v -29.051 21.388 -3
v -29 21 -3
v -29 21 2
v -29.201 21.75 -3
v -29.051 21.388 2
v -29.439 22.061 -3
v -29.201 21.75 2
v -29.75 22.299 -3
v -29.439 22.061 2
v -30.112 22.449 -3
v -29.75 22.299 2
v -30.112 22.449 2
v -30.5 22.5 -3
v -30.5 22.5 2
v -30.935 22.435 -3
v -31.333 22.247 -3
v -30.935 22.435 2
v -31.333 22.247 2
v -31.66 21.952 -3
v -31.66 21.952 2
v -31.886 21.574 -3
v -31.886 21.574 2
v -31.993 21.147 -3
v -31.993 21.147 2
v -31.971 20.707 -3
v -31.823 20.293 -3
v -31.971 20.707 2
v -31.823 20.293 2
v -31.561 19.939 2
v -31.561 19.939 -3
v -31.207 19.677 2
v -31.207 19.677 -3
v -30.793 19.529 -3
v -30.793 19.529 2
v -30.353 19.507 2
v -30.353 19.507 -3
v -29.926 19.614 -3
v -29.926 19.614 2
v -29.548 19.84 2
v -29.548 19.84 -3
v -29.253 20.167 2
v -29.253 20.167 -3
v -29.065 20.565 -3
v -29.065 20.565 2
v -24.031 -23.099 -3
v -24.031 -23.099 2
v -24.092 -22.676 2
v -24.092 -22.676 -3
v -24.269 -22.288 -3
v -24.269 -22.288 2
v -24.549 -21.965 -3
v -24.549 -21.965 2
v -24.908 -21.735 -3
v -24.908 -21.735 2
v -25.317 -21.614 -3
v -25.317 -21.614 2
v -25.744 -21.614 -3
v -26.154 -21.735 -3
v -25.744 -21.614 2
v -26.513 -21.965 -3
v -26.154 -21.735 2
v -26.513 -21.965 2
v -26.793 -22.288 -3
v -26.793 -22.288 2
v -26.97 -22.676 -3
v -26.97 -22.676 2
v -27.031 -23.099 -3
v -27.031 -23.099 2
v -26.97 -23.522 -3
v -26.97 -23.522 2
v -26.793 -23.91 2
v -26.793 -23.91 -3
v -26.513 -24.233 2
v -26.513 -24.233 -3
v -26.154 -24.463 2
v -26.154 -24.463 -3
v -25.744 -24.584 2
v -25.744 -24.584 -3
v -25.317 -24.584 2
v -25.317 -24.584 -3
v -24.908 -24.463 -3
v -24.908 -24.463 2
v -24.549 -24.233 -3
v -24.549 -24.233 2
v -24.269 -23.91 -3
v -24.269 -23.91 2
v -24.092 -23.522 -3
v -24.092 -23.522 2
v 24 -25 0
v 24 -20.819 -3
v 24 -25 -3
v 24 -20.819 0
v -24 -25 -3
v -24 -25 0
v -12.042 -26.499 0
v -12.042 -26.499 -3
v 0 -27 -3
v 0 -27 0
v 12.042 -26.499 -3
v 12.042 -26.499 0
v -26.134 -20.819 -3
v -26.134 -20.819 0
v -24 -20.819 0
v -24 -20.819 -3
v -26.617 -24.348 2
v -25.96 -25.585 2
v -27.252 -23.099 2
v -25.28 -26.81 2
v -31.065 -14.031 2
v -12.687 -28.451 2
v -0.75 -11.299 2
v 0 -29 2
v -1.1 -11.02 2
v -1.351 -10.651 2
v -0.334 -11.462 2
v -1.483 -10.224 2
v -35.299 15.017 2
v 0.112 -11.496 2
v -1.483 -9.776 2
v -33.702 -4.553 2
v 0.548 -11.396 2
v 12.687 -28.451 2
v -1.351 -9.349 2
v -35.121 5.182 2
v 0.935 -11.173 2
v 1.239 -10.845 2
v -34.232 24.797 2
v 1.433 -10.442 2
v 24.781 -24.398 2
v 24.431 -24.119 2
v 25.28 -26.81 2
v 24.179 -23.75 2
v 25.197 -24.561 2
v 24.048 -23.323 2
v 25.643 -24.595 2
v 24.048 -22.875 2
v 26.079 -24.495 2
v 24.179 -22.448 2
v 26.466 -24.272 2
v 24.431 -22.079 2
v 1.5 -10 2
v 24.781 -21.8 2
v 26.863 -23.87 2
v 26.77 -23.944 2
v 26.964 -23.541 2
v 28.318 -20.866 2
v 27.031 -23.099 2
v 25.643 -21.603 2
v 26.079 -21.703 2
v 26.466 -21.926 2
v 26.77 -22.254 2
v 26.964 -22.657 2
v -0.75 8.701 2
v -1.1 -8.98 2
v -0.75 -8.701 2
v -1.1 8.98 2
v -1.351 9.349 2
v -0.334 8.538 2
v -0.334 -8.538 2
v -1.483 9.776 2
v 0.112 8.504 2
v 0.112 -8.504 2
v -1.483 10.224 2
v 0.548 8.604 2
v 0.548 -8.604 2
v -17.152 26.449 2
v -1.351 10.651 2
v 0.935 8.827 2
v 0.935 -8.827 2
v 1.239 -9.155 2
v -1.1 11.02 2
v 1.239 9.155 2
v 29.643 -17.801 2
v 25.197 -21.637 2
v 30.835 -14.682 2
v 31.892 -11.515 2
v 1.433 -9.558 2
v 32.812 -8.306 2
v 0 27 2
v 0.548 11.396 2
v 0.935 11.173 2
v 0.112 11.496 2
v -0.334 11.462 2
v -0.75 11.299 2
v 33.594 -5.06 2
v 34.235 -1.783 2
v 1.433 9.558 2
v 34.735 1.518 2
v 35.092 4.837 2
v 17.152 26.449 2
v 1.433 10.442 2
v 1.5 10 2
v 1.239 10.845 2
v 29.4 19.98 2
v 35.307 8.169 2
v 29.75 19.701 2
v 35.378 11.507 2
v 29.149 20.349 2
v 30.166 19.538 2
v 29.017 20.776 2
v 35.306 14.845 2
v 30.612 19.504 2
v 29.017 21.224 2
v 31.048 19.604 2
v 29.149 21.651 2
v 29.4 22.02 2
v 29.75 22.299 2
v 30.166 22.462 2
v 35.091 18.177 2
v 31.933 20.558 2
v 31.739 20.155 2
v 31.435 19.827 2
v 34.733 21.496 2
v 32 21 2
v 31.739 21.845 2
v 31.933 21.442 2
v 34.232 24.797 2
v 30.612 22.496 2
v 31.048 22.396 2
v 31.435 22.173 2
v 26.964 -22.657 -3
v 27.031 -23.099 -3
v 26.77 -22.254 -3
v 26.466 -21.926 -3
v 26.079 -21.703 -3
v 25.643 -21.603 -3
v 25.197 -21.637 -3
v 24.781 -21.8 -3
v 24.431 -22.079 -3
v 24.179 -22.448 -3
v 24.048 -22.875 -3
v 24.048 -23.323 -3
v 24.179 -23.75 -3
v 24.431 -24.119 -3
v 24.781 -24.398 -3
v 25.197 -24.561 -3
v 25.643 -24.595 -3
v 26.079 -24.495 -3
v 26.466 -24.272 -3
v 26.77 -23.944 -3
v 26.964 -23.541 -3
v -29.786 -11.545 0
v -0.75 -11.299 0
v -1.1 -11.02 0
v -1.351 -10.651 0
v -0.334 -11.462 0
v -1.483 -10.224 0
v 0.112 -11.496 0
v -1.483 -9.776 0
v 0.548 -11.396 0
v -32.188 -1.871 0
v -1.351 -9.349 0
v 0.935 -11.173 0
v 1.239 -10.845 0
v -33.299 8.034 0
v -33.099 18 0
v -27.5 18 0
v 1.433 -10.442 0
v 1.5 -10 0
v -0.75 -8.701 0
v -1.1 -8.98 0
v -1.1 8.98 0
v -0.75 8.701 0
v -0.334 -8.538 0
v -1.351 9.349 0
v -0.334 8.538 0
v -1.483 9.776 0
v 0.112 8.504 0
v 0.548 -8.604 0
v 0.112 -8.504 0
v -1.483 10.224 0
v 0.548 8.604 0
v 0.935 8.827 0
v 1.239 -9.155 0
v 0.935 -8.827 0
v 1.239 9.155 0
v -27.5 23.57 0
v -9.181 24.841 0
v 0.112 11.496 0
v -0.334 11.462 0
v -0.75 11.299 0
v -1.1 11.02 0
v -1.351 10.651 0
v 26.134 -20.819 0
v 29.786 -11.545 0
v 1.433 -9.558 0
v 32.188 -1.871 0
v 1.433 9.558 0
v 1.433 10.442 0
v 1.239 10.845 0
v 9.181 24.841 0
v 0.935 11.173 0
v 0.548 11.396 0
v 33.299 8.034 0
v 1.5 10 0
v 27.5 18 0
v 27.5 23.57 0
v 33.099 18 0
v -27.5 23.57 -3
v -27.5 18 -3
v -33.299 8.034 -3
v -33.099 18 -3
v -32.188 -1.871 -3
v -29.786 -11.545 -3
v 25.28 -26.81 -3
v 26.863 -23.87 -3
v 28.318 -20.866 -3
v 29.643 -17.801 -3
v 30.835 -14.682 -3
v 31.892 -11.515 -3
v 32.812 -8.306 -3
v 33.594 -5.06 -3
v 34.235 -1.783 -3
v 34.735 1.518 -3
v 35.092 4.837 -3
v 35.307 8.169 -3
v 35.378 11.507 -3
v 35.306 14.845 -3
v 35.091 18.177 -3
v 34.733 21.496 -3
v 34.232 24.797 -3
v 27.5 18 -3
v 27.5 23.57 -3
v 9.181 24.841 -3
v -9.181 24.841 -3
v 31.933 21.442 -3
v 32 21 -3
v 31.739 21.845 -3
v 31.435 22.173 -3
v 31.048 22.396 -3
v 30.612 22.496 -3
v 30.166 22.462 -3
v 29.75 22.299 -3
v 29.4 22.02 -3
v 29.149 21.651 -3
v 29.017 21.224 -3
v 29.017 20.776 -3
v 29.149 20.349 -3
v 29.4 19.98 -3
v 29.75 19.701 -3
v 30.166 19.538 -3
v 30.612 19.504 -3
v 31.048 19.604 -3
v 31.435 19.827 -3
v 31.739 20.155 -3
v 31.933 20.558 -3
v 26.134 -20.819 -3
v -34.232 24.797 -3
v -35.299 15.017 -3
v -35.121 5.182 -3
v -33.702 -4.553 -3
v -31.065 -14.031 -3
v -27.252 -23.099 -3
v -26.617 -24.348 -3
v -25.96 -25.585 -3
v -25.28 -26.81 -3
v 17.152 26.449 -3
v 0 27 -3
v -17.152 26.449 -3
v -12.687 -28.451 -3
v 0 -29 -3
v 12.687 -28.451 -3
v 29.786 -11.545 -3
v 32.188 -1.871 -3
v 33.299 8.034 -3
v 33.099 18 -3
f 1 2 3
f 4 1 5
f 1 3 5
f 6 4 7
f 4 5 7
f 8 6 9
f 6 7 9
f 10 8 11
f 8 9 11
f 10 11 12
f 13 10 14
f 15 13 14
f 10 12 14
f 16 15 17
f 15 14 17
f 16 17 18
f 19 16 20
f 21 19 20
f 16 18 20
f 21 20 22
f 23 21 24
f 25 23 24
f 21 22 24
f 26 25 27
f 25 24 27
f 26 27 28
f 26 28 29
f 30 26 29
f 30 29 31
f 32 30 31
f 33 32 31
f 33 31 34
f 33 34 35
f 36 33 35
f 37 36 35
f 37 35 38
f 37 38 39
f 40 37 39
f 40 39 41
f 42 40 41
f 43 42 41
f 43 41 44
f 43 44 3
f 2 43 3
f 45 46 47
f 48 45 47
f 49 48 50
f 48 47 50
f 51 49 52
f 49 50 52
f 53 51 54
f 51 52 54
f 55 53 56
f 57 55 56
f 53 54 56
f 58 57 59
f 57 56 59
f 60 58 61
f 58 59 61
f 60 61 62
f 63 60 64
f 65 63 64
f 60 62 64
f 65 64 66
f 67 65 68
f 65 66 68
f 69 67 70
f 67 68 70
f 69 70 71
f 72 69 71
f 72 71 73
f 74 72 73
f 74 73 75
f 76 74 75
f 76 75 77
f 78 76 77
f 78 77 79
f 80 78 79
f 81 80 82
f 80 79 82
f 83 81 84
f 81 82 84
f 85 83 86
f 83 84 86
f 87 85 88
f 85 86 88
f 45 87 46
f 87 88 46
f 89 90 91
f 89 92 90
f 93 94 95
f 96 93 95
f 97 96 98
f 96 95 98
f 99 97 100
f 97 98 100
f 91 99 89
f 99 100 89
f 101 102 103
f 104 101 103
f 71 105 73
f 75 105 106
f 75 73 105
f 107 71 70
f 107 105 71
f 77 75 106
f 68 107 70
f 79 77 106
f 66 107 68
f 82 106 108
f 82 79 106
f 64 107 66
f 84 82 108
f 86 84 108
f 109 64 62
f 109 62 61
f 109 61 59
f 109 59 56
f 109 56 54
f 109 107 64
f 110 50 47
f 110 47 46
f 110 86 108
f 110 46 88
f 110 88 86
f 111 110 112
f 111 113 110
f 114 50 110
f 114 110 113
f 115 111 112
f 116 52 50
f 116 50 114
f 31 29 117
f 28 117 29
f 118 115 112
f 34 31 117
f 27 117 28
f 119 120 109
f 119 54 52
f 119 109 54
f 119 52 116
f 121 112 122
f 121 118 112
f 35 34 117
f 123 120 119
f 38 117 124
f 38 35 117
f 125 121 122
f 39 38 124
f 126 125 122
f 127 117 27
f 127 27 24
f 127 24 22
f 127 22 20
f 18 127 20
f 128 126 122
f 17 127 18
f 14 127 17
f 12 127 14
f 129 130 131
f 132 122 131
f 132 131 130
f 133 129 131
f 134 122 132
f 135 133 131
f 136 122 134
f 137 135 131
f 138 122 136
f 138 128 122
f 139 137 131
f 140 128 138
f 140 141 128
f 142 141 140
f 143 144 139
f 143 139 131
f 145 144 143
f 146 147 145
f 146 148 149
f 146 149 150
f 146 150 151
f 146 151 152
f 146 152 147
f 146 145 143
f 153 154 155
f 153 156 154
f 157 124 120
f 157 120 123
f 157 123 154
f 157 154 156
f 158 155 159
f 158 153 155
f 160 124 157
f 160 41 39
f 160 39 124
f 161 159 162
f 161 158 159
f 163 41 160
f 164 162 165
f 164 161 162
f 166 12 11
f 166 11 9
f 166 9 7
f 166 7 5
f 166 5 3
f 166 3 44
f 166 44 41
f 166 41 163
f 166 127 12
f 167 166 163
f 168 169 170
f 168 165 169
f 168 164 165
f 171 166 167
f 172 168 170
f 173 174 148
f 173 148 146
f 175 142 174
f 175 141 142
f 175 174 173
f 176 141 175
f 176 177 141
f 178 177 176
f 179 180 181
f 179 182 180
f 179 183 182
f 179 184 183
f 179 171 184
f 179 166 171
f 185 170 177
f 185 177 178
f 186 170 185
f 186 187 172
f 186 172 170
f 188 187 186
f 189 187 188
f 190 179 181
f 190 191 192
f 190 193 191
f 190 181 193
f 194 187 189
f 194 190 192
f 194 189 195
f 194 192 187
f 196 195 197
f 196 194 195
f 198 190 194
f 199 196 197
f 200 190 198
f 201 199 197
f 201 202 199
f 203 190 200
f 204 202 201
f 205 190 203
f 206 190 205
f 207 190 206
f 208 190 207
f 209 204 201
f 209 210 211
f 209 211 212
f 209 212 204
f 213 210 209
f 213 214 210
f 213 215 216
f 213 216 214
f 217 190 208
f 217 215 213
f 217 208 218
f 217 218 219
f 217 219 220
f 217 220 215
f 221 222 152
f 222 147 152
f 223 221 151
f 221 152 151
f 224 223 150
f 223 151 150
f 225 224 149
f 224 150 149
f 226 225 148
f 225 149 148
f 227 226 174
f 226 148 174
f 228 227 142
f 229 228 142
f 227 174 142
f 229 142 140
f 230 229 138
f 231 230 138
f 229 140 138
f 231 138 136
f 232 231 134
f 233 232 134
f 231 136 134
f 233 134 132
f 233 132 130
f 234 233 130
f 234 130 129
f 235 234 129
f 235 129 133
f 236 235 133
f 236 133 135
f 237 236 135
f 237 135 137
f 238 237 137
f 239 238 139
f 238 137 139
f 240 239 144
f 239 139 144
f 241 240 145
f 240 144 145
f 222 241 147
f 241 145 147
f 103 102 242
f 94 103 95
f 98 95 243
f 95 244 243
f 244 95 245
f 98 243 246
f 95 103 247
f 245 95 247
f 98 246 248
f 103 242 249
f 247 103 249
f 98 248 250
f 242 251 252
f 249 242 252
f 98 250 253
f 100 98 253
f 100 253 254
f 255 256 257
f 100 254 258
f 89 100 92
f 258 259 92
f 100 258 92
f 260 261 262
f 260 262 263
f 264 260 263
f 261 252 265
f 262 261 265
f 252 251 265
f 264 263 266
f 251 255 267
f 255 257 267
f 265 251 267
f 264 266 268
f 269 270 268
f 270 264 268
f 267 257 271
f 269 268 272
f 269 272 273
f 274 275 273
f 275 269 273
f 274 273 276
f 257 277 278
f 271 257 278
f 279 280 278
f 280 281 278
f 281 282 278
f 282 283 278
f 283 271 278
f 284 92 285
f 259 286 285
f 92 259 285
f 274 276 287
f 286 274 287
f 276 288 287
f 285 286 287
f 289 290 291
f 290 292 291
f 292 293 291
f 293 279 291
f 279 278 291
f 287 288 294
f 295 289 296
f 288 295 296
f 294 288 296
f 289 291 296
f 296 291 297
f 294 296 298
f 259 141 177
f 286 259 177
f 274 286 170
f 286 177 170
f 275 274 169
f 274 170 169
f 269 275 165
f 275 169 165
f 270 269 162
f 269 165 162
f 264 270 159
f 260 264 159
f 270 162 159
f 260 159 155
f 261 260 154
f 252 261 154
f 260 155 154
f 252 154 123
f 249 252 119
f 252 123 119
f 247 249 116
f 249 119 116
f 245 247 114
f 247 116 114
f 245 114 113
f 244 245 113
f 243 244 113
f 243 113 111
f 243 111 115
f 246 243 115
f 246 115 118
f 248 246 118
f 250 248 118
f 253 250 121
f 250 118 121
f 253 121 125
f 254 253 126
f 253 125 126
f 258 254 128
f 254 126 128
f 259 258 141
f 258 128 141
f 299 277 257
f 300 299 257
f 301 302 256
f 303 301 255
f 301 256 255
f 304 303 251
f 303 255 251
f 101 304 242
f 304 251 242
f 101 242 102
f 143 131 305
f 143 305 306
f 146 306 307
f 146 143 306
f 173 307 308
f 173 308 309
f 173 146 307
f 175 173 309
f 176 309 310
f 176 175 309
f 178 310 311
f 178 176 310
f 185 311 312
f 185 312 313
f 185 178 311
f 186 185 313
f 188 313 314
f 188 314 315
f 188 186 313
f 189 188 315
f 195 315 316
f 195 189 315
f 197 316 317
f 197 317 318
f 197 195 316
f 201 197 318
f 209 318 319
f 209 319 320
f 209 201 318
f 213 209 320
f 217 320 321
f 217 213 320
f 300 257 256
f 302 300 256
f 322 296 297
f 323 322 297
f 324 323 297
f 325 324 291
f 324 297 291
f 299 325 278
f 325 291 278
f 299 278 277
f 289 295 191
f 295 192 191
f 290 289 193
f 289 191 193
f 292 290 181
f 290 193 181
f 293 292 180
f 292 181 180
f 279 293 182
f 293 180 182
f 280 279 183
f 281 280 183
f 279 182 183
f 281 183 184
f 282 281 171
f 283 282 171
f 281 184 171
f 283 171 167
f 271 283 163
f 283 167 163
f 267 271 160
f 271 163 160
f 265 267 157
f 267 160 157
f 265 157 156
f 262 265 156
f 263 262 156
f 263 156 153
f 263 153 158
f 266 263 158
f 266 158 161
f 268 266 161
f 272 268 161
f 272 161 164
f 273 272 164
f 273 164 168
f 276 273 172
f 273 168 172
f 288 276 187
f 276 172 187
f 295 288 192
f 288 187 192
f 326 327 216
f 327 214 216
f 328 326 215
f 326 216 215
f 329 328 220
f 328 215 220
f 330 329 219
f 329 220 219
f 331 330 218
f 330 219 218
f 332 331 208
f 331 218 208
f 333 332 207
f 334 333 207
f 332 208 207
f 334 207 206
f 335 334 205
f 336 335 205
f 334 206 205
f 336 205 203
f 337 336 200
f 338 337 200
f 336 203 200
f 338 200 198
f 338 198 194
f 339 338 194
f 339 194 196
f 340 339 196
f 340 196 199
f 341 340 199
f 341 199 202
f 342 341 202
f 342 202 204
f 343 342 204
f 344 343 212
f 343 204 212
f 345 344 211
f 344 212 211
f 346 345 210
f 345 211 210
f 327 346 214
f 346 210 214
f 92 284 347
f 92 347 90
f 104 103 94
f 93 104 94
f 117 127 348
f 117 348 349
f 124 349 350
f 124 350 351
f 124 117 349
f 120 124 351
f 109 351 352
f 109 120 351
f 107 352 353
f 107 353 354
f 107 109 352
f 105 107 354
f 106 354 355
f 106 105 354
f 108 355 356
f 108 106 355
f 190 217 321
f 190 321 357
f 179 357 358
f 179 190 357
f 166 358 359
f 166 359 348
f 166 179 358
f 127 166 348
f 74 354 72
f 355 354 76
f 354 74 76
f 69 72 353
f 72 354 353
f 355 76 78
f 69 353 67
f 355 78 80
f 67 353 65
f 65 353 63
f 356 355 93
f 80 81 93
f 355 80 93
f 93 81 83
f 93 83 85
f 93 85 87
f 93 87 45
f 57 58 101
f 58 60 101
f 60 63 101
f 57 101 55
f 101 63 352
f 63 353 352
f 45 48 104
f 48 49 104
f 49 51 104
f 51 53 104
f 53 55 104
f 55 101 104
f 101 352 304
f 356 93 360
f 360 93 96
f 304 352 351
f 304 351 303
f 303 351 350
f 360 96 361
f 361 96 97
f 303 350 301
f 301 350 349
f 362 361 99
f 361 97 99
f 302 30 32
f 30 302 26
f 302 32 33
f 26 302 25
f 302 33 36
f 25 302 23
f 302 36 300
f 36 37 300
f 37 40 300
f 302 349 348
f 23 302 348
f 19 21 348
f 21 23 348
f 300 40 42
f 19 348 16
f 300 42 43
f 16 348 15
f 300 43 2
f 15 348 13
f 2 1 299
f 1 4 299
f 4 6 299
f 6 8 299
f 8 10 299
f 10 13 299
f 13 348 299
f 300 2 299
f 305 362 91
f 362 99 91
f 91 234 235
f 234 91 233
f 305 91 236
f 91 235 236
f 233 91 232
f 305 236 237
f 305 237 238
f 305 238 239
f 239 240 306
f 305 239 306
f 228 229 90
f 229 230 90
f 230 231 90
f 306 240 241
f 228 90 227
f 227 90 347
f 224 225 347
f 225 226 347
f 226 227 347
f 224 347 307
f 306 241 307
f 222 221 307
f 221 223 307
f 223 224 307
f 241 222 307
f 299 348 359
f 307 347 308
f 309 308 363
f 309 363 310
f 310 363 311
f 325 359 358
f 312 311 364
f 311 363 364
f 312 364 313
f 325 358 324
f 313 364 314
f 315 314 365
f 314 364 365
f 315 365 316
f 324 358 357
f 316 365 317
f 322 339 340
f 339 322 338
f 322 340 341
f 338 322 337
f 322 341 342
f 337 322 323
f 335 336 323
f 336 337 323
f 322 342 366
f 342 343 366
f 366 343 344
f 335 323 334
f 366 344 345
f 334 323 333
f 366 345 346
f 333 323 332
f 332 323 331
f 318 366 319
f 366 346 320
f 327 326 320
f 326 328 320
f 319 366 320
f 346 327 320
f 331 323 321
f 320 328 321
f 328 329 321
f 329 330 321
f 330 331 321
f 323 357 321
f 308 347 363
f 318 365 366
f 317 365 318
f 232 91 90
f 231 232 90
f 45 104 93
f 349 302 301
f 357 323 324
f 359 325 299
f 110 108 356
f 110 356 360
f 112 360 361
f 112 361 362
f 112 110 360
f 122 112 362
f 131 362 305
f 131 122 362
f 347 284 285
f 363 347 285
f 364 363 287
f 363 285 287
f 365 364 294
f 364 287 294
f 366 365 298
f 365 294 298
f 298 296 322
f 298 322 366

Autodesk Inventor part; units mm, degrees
ref_plane "YZ Plane" through (0, 0, 0) normal (1, 0, 0) x (0, 1, 0)
ref_plane "XZ Plane" through (0, 0, 0) normal (0, 1, 0) x (-1, 0, 0)
ref_plane "XY Plane" through (0, 0, 0) normal (0, 0, 1) x (1, 0, 0)
sketch "Sketch1" plane through (0, 0, 0) normal (0, 0, 1) x (1, 0, 0)
  line L0 (0, 0) -> (0, 23)
  line L1 (0, 0) -> (0, -25)
  line L2 (0, 0) -> (-32.5, 0)
  line L3 (0, 0) -> (32.5, 0)
  line L4 (0, 23) -> (0, 25)
  line L5 (0, -25) -> (0, -27)
  arc A0 (32.5, 23) -> (-32.5, 23) centre (0, -240.0625) ccw
  arc A1 (-24, -25) -> (24, -25) centre (0, 118) ccw
  arc A2 (-34.2324, 24.7969) -> (-25.28, -26.8099) centre (42.3382, 11.5) ccw
  arc A3 (34.2324, 24.7969) -> (-34.2324, 24.7969) centre (0, -240.0625) ccw
  arc A4 (25.28, -26.8099) -> (34.2324, 24.7969) centre (-42.3382, 11.5) ccw
  arc A5 (-25.28, -26.8099) -> (25.28, -26.8099) centre (0, 118) ccw
  line L6 (24, -25) -> (-24, -25)
  line L7 (-32.5, 23) -> (-30.5, 23)
  line L8 (-30.5, 23) -> (-30.5, 21)
  circle A6 centre (-30.5, 21) radius 1.5
  line L9 (-27.5, 23) -> (-27.5, 18)
  line L10 (-27.5, 18) -> (-33.0989, 18)
  line L11 (-32.5, 23) -> (-30.5, 23)
  line L12 (-27.5, 23) -> (27.5, 23)
  line L13 (-27.5, 23) -> (-27.5, 23.5696)
  circle A7 centre (30.5, 21) radius 1.5
  line L14 (27.5, 23) -> (27.5, 18)
  line L15 (27.5, 18) -> (33.0989, 18)
  line L16 (27.5, 23) -> (27.5, 23.5696)
  line L17 (-25.28, -26.8099) -> (-27.252, -26.8099)
  line L18 (-27.252, -26.8099) -> (-27.2519, -23.0989)
  line L19 (-27.2519, -23.0989) -> (-25.5309, -23.099)
  circle A8 centre (-25.5309, -23.099) radius 1.5
  line L20 (-26.1342, -20.8192) -> (-24, -20.8192)
  line L21 (-24, -20.8192) -> (-24, -25)
  arc A9 (-32.5, 23) -> (-26.1342, -20.8192) centre (42.3382, 11.5) ccw
  circle A10 centre (25.5309, -23.099) radius 1.5
  line L22 (26.1342, -20.8192) -> (24, -20.8192)
  line L23 (24, -20.8192) -> (24, -25)
  arc A11 (26.1342, -20.8192) -> (32.5, 23) centre (-42.3382, 11.5) ccw
  point P0 (24, -25)
  dimension "d0" = 23
  dimension "d1" = 25
  dimension "d4" = 65
  dimension "d6" = 48
  dimension "d7" = 32.5
  dimension "d8" = 32.5
  dimension "d9" = 2
  dimension "d10" = 2
  dimension "d12" = 2
  dimension "d13" = 2
  dimension "d14" = 3
  dimension "d15" = 5
  dimension "d16" = 5
  dimension "d17" = 1.972
  dimension "d18" = 3.711
  dimension "d19" = 1.721
  dimension "d20" = 3
extrude "Extrusion1" add sketch "Sketch1" along normal blind 2 contours L2 A9 L10 L9 L12 L0 | L3 A11 L22 L23 L6 L1 | L1 L6 L21 L20 A9 L2 | L0 L12 L14 L15 A11 L3 | L12 L13 A0 L4 | L4 A0 L16 L12 | L6 A1 L5 | L5 A1 L6 | A6 | L9 L10 A9 A0 L13 | L16 A0 A11 L15 L14 | A8 | A3 A4 A5 A2 | A7 | A10
extrude "Extrusion2" add sketch "Sketch1" against normal blind 3 contours L9 L10 A9 A0 L13 | L16 A0 A11 L15 L14 | A3 A4 A5 A2
sketch "Sketch2" plane through (0, 0, 2) normal (0, 0, 1) x (1, 0, 0)
  circle A0 centre (0, 10) radius 1.5
  circle A1 centre (0, -10) radius 1.5
  point P0 (0, 0)
  dimension "d27" = 3
  dimension "d28" = 3
extrude "Extrusion3" cut sketch "Sketch2" against normal up to surface (2 mm away)
extrude "Extrusion4" cut sketch "Sketch1" along normal blind 10 contours A6 | A8 | A7 | A10
properties part number "ProjEnAble_Microbit_Cover"
